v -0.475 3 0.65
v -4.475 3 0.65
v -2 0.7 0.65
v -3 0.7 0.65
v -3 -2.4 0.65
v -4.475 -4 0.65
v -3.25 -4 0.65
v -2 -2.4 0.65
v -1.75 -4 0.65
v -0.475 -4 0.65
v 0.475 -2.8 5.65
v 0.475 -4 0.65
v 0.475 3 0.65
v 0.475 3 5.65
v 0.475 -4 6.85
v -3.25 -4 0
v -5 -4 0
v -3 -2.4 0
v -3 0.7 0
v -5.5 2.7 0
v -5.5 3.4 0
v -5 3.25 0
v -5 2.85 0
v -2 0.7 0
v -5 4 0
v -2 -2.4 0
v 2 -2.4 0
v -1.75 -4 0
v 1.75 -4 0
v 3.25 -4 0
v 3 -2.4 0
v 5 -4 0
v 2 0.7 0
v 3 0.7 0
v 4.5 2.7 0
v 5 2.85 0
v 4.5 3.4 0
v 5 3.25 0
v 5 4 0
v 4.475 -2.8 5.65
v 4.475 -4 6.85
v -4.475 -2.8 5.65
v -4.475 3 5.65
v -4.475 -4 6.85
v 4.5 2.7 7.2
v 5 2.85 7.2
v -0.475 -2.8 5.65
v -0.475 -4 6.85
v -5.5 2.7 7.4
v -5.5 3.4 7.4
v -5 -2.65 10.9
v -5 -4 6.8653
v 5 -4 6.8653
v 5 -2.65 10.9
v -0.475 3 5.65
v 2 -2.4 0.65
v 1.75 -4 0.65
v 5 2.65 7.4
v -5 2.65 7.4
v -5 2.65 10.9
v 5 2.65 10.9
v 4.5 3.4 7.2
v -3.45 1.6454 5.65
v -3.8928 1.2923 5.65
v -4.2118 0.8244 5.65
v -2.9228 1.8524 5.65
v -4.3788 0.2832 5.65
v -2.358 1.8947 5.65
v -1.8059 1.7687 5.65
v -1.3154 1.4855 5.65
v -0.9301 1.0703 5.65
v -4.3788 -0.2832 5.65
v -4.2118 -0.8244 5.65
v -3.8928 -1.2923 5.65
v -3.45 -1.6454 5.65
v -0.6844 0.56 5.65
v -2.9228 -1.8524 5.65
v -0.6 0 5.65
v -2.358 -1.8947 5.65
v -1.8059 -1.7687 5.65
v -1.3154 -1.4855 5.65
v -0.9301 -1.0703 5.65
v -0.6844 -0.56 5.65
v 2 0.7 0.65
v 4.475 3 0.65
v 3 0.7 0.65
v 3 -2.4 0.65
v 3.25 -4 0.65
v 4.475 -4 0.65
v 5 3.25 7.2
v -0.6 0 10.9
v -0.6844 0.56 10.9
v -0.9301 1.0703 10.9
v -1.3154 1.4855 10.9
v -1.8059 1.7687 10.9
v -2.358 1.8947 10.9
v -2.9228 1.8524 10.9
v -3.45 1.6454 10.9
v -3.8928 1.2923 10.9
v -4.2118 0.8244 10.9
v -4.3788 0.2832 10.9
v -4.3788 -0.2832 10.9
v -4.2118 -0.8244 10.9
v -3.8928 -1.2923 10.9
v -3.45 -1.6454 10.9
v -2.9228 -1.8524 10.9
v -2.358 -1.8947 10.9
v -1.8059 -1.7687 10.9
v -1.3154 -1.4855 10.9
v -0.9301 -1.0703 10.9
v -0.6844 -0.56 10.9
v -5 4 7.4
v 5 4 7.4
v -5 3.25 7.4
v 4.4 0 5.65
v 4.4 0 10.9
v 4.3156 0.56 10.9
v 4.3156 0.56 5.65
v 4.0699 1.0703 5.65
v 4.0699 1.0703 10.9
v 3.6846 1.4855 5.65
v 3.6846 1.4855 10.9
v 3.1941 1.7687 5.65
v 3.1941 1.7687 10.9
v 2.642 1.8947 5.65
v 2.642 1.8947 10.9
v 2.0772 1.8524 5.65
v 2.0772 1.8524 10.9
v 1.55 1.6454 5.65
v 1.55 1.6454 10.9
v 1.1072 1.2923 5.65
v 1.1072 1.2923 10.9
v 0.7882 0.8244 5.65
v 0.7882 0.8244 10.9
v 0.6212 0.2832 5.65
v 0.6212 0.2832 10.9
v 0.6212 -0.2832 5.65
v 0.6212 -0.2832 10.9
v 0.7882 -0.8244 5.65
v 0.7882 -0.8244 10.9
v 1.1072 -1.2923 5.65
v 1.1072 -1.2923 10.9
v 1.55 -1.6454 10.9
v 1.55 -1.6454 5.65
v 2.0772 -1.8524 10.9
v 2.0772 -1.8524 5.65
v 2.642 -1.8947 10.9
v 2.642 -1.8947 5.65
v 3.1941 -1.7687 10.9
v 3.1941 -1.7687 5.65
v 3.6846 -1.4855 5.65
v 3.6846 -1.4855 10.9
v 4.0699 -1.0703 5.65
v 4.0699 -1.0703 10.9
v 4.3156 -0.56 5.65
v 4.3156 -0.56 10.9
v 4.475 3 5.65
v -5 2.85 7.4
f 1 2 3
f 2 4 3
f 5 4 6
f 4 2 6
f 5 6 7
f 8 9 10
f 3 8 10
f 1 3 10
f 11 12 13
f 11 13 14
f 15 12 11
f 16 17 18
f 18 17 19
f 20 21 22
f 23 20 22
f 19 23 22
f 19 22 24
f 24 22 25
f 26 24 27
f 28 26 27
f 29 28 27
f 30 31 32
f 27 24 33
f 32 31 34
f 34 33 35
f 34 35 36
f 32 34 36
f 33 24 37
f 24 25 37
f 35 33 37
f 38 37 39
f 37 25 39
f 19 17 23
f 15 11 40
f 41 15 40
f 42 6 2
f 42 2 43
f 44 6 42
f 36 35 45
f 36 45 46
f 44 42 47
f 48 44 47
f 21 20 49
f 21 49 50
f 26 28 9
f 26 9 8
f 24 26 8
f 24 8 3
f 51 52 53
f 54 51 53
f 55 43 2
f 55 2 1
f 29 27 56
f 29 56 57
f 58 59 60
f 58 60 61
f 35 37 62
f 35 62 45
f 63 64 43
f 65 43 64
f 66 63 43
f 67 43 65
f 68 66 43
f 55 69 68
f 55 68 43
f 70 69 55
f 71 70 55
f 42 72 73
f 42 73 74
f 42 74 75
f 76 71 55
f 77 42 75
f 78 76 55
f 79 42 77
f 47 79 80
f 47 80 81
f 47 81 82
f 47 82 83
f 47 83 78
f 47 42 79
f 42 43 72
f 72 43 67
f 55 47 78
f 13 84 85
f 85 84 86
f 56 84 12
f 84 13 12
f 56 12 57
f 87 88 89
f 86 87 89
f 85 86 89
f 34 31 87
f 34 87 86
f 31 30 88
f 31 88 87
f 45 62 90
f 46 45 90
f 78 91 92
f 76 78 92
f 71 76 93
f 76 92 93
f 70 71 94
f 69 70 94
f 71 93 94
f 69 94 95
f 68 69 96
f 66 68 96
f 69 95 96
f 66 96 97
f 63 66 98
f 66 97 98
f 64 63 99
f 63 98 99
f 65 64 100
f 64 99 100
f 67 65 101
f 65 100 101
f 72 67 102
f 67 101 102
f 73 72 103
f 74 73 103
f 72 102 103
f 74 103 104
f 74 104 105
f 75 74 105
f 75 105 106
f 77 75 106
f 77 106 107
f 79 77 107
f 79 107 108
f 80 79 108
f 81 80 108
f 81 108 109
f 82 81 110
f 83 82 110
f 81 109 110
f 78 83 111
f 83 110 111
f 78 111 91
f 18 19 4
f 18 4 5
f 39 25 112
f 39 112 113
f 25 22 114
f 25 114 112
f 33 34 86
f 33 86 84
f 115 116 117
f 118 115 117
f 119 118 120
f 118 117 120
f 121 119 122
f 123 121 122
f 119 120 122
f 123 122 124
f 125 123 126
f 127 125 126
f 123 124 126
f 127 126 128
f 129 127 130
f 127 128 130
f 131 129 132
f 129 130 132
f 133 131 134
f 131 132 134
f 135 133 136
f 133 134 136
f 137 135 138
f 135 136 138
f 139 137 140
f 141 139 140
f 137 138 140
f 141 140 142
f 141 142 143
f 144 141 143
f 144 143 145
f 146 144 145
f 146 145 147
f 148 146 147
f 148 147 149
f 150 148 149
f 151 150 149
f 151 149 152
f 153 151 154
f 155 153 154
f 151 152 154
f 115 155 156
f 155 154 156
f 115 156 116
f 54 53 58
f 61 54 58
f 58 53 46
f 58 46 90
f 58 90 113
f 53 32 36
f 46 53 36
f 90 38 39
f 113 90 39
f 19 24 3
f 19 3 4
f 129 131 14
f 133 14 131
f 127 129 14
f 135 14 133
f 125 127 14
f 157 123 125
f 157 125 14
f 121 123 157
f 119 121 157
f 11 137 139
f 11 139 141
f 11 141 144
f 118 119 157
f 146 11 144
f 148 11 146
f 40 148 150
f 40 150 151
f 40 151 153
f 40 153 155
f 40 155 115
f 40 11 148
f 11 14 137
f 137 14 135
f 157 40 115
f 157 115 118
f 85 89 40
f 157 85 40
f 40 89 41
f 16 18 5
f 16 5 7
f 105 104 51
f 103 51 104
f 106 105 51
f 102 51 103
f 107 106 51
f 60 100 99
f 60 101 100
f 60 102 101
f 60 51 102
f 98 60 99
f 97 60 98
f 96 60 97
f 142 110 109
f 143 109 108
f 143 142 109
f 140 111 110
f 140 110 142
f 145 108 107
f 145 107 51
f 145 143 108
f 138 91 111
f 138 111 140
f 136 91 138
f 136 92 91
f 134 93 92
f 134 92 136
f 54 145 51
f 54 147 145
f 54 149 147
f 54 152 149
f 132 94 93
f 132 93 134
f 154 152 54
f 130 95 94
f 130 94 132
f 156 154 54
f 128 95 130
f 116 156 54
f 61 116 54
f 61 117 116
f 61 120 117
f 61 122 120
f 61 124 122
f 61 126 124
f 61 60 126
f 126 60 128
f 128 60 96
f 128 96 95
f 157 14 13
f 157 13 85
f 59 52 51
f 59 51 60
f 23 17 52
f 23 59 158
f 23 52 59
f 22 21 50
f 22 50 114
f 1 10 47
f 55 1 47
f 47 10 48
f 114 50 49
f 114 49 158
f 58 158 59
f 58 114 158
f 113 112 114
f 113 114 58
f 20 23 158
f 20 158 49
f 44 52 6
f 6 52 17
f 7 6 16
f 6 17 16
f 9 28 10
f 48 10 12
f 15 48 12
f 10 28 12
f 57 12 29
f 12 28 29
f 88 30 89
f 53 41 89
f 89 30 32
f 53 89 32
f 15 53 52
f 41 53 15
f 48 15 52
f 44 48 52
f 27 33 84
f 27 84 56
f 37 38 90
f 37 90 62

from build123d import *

# Parameters (mm, degrees)
SKETCH1_W           = 10
SKETCH1_H           = 8
BOSS_EXTRUDE1_DEPTH = 10.9
CHAMFER1_SIZE       = 1.35
CHAMFER1_SIZE2      = 4.0347247
SKETCH2_W           = 10
SKETCH2_H           = 3.5
CUT_EXTRUDE1_DEPTH  = 1.35
SKETCH3_W           = 4
SKETCH3_H           = 5
CUT_EXTRUDE2_DEPTH  = 7
CHAMFER2_SIZE       = 1.2
CUT_EXTRUDE3_DEPTH  = 0.65
SKETCH5_R           = 1.9
CUT_EXTRUDE4_DEPTH  = 5.25
BOSS_EXTRUDE3_DEPTH = 7.4
CUT_EXTRUDE5_DEPTH  = 7.2


with BuildPart() as part:
    # Sketch1 → Boss-Extrude1 (new body)
    with BuildSketch(Plane.XY):
        Rectangle(SKETCH1_W, SKETCH1_H)
    extrude(amount=BOSS_EXTRUDE1_DEPTH)

    # Chamfer1
    chamfer1_edges = [part.edges().sort_by_distance(p)[0] for p in [
        (0, -4, 10.9),
    ]]
    chamfer1_side = [part.faces().sort_by_distance(p)[0] for p in [
        (0, 0, 10.9),
    ]]
    chamfer(chamfer1_edges, length=CHAMFER1_SIZE, length2=CHAMFER1_SIZE2, reference=chamfer1_side[0])

    # Sketch2 → Cut-Extrude1 (cut)
    with BuildSketch(Plane(origin=(0, 4, 0), x_dir=(1, 0, 0), z_dir=(0, 1, 0))):
        with Locations((0, -9.15)):
            Rectangle(SKETCH2_W, SKETCH2_H)
    extrude(amount=-CUT_EXTRUDE1_DEPTH, mode=Mode.SUBTRACT)

    # Sketch3 → Cut-Extrude2 (cut)
    with BuildSketch(Plane.XZ.offset(4)):
        with Locations((-2.475, 3.15)):
            Rectangle(SKETCH3_W, SKETCH3_H)
        with Locations((2.475, 3.15)):
            Rectangle(SKETCH3_W, SKETCH3_H)
    extrude(amount=-CUT_EXTRUDE2_DEPTH, mode=Mode.SUBTRACT)

    # Chamfer2
    chamfer2_edges = [part.edges().sort_by_distance(p)[0] for p in [
        (-2.475, -4, 5.65),
        (2.475, -4, 5.65),
    ]]
    chamfer(chamfer2_edges, length=CHAMFER2_SIZE)

    # Sketch4 → Cut-Extrude3 (cut)
    with BuildSketch(Plane(origin=(0, 0, 0), x_dir=(-1, 0, 0), z_dir=(0, 0, -1))):
        Polygon((2, 0.7), (3, 0.7), (3, -2.4), (3.25, -4), (1.75, -4), (2, -2.4), align=None)
        Polygon((-2, 0.7), (-2, -2.4), (-1.75, -4), (-3.25, -4), (-3, -2.4), (-3, 0.7), align=None)
    extrude(amount=-CUT_EXTRUDE3_DEPTH, mode=Mode.SUBTRACT)

    # Sketch5 → Cut-Extrude4 (cut)
    with BuildSketch(Plane.XY.offset(10.9)):
        with Locations((-2.5, 0)):
            Circle(SKETCH5_R)
        with Locations((2.5, 0)):
            Circle(SKETCH5_R)
    extrude(amount=-CUT_EXTRUDE4_DEPTH, mode=Mode.SUBTRACT)

    # Sketch6 → Boss-Extrude3 (add)
    with BuildSketch(Plane(origin=(0, 0, 0), x_dir=(-1, 0, 0), z_dir=(0, 0, -1))):
        Polygon((5, 3.25), (5, 2.85), (5.5, 2.7), (5.5, 3.4), align=None)
    extrude(amount=-BOSS_EXTRUDE3_DEPTH)

    # Sketch7 → Cut-Extrude5 (cut)
    with BuildSketch(Plane(origin=(0, 0, 0), x_dir=(-1, 0, 0), z_dir=(0, 0, -1))):
        Polygon((-5, 3.25), (-4.5, 3.4), (-4.5, 2.7), (-5, 2.85), align=None)
    extrude(amount=-CUT_EXTRUDE5_DEPTH, mode=Mode.SUBTRACT)


solid = part.part
